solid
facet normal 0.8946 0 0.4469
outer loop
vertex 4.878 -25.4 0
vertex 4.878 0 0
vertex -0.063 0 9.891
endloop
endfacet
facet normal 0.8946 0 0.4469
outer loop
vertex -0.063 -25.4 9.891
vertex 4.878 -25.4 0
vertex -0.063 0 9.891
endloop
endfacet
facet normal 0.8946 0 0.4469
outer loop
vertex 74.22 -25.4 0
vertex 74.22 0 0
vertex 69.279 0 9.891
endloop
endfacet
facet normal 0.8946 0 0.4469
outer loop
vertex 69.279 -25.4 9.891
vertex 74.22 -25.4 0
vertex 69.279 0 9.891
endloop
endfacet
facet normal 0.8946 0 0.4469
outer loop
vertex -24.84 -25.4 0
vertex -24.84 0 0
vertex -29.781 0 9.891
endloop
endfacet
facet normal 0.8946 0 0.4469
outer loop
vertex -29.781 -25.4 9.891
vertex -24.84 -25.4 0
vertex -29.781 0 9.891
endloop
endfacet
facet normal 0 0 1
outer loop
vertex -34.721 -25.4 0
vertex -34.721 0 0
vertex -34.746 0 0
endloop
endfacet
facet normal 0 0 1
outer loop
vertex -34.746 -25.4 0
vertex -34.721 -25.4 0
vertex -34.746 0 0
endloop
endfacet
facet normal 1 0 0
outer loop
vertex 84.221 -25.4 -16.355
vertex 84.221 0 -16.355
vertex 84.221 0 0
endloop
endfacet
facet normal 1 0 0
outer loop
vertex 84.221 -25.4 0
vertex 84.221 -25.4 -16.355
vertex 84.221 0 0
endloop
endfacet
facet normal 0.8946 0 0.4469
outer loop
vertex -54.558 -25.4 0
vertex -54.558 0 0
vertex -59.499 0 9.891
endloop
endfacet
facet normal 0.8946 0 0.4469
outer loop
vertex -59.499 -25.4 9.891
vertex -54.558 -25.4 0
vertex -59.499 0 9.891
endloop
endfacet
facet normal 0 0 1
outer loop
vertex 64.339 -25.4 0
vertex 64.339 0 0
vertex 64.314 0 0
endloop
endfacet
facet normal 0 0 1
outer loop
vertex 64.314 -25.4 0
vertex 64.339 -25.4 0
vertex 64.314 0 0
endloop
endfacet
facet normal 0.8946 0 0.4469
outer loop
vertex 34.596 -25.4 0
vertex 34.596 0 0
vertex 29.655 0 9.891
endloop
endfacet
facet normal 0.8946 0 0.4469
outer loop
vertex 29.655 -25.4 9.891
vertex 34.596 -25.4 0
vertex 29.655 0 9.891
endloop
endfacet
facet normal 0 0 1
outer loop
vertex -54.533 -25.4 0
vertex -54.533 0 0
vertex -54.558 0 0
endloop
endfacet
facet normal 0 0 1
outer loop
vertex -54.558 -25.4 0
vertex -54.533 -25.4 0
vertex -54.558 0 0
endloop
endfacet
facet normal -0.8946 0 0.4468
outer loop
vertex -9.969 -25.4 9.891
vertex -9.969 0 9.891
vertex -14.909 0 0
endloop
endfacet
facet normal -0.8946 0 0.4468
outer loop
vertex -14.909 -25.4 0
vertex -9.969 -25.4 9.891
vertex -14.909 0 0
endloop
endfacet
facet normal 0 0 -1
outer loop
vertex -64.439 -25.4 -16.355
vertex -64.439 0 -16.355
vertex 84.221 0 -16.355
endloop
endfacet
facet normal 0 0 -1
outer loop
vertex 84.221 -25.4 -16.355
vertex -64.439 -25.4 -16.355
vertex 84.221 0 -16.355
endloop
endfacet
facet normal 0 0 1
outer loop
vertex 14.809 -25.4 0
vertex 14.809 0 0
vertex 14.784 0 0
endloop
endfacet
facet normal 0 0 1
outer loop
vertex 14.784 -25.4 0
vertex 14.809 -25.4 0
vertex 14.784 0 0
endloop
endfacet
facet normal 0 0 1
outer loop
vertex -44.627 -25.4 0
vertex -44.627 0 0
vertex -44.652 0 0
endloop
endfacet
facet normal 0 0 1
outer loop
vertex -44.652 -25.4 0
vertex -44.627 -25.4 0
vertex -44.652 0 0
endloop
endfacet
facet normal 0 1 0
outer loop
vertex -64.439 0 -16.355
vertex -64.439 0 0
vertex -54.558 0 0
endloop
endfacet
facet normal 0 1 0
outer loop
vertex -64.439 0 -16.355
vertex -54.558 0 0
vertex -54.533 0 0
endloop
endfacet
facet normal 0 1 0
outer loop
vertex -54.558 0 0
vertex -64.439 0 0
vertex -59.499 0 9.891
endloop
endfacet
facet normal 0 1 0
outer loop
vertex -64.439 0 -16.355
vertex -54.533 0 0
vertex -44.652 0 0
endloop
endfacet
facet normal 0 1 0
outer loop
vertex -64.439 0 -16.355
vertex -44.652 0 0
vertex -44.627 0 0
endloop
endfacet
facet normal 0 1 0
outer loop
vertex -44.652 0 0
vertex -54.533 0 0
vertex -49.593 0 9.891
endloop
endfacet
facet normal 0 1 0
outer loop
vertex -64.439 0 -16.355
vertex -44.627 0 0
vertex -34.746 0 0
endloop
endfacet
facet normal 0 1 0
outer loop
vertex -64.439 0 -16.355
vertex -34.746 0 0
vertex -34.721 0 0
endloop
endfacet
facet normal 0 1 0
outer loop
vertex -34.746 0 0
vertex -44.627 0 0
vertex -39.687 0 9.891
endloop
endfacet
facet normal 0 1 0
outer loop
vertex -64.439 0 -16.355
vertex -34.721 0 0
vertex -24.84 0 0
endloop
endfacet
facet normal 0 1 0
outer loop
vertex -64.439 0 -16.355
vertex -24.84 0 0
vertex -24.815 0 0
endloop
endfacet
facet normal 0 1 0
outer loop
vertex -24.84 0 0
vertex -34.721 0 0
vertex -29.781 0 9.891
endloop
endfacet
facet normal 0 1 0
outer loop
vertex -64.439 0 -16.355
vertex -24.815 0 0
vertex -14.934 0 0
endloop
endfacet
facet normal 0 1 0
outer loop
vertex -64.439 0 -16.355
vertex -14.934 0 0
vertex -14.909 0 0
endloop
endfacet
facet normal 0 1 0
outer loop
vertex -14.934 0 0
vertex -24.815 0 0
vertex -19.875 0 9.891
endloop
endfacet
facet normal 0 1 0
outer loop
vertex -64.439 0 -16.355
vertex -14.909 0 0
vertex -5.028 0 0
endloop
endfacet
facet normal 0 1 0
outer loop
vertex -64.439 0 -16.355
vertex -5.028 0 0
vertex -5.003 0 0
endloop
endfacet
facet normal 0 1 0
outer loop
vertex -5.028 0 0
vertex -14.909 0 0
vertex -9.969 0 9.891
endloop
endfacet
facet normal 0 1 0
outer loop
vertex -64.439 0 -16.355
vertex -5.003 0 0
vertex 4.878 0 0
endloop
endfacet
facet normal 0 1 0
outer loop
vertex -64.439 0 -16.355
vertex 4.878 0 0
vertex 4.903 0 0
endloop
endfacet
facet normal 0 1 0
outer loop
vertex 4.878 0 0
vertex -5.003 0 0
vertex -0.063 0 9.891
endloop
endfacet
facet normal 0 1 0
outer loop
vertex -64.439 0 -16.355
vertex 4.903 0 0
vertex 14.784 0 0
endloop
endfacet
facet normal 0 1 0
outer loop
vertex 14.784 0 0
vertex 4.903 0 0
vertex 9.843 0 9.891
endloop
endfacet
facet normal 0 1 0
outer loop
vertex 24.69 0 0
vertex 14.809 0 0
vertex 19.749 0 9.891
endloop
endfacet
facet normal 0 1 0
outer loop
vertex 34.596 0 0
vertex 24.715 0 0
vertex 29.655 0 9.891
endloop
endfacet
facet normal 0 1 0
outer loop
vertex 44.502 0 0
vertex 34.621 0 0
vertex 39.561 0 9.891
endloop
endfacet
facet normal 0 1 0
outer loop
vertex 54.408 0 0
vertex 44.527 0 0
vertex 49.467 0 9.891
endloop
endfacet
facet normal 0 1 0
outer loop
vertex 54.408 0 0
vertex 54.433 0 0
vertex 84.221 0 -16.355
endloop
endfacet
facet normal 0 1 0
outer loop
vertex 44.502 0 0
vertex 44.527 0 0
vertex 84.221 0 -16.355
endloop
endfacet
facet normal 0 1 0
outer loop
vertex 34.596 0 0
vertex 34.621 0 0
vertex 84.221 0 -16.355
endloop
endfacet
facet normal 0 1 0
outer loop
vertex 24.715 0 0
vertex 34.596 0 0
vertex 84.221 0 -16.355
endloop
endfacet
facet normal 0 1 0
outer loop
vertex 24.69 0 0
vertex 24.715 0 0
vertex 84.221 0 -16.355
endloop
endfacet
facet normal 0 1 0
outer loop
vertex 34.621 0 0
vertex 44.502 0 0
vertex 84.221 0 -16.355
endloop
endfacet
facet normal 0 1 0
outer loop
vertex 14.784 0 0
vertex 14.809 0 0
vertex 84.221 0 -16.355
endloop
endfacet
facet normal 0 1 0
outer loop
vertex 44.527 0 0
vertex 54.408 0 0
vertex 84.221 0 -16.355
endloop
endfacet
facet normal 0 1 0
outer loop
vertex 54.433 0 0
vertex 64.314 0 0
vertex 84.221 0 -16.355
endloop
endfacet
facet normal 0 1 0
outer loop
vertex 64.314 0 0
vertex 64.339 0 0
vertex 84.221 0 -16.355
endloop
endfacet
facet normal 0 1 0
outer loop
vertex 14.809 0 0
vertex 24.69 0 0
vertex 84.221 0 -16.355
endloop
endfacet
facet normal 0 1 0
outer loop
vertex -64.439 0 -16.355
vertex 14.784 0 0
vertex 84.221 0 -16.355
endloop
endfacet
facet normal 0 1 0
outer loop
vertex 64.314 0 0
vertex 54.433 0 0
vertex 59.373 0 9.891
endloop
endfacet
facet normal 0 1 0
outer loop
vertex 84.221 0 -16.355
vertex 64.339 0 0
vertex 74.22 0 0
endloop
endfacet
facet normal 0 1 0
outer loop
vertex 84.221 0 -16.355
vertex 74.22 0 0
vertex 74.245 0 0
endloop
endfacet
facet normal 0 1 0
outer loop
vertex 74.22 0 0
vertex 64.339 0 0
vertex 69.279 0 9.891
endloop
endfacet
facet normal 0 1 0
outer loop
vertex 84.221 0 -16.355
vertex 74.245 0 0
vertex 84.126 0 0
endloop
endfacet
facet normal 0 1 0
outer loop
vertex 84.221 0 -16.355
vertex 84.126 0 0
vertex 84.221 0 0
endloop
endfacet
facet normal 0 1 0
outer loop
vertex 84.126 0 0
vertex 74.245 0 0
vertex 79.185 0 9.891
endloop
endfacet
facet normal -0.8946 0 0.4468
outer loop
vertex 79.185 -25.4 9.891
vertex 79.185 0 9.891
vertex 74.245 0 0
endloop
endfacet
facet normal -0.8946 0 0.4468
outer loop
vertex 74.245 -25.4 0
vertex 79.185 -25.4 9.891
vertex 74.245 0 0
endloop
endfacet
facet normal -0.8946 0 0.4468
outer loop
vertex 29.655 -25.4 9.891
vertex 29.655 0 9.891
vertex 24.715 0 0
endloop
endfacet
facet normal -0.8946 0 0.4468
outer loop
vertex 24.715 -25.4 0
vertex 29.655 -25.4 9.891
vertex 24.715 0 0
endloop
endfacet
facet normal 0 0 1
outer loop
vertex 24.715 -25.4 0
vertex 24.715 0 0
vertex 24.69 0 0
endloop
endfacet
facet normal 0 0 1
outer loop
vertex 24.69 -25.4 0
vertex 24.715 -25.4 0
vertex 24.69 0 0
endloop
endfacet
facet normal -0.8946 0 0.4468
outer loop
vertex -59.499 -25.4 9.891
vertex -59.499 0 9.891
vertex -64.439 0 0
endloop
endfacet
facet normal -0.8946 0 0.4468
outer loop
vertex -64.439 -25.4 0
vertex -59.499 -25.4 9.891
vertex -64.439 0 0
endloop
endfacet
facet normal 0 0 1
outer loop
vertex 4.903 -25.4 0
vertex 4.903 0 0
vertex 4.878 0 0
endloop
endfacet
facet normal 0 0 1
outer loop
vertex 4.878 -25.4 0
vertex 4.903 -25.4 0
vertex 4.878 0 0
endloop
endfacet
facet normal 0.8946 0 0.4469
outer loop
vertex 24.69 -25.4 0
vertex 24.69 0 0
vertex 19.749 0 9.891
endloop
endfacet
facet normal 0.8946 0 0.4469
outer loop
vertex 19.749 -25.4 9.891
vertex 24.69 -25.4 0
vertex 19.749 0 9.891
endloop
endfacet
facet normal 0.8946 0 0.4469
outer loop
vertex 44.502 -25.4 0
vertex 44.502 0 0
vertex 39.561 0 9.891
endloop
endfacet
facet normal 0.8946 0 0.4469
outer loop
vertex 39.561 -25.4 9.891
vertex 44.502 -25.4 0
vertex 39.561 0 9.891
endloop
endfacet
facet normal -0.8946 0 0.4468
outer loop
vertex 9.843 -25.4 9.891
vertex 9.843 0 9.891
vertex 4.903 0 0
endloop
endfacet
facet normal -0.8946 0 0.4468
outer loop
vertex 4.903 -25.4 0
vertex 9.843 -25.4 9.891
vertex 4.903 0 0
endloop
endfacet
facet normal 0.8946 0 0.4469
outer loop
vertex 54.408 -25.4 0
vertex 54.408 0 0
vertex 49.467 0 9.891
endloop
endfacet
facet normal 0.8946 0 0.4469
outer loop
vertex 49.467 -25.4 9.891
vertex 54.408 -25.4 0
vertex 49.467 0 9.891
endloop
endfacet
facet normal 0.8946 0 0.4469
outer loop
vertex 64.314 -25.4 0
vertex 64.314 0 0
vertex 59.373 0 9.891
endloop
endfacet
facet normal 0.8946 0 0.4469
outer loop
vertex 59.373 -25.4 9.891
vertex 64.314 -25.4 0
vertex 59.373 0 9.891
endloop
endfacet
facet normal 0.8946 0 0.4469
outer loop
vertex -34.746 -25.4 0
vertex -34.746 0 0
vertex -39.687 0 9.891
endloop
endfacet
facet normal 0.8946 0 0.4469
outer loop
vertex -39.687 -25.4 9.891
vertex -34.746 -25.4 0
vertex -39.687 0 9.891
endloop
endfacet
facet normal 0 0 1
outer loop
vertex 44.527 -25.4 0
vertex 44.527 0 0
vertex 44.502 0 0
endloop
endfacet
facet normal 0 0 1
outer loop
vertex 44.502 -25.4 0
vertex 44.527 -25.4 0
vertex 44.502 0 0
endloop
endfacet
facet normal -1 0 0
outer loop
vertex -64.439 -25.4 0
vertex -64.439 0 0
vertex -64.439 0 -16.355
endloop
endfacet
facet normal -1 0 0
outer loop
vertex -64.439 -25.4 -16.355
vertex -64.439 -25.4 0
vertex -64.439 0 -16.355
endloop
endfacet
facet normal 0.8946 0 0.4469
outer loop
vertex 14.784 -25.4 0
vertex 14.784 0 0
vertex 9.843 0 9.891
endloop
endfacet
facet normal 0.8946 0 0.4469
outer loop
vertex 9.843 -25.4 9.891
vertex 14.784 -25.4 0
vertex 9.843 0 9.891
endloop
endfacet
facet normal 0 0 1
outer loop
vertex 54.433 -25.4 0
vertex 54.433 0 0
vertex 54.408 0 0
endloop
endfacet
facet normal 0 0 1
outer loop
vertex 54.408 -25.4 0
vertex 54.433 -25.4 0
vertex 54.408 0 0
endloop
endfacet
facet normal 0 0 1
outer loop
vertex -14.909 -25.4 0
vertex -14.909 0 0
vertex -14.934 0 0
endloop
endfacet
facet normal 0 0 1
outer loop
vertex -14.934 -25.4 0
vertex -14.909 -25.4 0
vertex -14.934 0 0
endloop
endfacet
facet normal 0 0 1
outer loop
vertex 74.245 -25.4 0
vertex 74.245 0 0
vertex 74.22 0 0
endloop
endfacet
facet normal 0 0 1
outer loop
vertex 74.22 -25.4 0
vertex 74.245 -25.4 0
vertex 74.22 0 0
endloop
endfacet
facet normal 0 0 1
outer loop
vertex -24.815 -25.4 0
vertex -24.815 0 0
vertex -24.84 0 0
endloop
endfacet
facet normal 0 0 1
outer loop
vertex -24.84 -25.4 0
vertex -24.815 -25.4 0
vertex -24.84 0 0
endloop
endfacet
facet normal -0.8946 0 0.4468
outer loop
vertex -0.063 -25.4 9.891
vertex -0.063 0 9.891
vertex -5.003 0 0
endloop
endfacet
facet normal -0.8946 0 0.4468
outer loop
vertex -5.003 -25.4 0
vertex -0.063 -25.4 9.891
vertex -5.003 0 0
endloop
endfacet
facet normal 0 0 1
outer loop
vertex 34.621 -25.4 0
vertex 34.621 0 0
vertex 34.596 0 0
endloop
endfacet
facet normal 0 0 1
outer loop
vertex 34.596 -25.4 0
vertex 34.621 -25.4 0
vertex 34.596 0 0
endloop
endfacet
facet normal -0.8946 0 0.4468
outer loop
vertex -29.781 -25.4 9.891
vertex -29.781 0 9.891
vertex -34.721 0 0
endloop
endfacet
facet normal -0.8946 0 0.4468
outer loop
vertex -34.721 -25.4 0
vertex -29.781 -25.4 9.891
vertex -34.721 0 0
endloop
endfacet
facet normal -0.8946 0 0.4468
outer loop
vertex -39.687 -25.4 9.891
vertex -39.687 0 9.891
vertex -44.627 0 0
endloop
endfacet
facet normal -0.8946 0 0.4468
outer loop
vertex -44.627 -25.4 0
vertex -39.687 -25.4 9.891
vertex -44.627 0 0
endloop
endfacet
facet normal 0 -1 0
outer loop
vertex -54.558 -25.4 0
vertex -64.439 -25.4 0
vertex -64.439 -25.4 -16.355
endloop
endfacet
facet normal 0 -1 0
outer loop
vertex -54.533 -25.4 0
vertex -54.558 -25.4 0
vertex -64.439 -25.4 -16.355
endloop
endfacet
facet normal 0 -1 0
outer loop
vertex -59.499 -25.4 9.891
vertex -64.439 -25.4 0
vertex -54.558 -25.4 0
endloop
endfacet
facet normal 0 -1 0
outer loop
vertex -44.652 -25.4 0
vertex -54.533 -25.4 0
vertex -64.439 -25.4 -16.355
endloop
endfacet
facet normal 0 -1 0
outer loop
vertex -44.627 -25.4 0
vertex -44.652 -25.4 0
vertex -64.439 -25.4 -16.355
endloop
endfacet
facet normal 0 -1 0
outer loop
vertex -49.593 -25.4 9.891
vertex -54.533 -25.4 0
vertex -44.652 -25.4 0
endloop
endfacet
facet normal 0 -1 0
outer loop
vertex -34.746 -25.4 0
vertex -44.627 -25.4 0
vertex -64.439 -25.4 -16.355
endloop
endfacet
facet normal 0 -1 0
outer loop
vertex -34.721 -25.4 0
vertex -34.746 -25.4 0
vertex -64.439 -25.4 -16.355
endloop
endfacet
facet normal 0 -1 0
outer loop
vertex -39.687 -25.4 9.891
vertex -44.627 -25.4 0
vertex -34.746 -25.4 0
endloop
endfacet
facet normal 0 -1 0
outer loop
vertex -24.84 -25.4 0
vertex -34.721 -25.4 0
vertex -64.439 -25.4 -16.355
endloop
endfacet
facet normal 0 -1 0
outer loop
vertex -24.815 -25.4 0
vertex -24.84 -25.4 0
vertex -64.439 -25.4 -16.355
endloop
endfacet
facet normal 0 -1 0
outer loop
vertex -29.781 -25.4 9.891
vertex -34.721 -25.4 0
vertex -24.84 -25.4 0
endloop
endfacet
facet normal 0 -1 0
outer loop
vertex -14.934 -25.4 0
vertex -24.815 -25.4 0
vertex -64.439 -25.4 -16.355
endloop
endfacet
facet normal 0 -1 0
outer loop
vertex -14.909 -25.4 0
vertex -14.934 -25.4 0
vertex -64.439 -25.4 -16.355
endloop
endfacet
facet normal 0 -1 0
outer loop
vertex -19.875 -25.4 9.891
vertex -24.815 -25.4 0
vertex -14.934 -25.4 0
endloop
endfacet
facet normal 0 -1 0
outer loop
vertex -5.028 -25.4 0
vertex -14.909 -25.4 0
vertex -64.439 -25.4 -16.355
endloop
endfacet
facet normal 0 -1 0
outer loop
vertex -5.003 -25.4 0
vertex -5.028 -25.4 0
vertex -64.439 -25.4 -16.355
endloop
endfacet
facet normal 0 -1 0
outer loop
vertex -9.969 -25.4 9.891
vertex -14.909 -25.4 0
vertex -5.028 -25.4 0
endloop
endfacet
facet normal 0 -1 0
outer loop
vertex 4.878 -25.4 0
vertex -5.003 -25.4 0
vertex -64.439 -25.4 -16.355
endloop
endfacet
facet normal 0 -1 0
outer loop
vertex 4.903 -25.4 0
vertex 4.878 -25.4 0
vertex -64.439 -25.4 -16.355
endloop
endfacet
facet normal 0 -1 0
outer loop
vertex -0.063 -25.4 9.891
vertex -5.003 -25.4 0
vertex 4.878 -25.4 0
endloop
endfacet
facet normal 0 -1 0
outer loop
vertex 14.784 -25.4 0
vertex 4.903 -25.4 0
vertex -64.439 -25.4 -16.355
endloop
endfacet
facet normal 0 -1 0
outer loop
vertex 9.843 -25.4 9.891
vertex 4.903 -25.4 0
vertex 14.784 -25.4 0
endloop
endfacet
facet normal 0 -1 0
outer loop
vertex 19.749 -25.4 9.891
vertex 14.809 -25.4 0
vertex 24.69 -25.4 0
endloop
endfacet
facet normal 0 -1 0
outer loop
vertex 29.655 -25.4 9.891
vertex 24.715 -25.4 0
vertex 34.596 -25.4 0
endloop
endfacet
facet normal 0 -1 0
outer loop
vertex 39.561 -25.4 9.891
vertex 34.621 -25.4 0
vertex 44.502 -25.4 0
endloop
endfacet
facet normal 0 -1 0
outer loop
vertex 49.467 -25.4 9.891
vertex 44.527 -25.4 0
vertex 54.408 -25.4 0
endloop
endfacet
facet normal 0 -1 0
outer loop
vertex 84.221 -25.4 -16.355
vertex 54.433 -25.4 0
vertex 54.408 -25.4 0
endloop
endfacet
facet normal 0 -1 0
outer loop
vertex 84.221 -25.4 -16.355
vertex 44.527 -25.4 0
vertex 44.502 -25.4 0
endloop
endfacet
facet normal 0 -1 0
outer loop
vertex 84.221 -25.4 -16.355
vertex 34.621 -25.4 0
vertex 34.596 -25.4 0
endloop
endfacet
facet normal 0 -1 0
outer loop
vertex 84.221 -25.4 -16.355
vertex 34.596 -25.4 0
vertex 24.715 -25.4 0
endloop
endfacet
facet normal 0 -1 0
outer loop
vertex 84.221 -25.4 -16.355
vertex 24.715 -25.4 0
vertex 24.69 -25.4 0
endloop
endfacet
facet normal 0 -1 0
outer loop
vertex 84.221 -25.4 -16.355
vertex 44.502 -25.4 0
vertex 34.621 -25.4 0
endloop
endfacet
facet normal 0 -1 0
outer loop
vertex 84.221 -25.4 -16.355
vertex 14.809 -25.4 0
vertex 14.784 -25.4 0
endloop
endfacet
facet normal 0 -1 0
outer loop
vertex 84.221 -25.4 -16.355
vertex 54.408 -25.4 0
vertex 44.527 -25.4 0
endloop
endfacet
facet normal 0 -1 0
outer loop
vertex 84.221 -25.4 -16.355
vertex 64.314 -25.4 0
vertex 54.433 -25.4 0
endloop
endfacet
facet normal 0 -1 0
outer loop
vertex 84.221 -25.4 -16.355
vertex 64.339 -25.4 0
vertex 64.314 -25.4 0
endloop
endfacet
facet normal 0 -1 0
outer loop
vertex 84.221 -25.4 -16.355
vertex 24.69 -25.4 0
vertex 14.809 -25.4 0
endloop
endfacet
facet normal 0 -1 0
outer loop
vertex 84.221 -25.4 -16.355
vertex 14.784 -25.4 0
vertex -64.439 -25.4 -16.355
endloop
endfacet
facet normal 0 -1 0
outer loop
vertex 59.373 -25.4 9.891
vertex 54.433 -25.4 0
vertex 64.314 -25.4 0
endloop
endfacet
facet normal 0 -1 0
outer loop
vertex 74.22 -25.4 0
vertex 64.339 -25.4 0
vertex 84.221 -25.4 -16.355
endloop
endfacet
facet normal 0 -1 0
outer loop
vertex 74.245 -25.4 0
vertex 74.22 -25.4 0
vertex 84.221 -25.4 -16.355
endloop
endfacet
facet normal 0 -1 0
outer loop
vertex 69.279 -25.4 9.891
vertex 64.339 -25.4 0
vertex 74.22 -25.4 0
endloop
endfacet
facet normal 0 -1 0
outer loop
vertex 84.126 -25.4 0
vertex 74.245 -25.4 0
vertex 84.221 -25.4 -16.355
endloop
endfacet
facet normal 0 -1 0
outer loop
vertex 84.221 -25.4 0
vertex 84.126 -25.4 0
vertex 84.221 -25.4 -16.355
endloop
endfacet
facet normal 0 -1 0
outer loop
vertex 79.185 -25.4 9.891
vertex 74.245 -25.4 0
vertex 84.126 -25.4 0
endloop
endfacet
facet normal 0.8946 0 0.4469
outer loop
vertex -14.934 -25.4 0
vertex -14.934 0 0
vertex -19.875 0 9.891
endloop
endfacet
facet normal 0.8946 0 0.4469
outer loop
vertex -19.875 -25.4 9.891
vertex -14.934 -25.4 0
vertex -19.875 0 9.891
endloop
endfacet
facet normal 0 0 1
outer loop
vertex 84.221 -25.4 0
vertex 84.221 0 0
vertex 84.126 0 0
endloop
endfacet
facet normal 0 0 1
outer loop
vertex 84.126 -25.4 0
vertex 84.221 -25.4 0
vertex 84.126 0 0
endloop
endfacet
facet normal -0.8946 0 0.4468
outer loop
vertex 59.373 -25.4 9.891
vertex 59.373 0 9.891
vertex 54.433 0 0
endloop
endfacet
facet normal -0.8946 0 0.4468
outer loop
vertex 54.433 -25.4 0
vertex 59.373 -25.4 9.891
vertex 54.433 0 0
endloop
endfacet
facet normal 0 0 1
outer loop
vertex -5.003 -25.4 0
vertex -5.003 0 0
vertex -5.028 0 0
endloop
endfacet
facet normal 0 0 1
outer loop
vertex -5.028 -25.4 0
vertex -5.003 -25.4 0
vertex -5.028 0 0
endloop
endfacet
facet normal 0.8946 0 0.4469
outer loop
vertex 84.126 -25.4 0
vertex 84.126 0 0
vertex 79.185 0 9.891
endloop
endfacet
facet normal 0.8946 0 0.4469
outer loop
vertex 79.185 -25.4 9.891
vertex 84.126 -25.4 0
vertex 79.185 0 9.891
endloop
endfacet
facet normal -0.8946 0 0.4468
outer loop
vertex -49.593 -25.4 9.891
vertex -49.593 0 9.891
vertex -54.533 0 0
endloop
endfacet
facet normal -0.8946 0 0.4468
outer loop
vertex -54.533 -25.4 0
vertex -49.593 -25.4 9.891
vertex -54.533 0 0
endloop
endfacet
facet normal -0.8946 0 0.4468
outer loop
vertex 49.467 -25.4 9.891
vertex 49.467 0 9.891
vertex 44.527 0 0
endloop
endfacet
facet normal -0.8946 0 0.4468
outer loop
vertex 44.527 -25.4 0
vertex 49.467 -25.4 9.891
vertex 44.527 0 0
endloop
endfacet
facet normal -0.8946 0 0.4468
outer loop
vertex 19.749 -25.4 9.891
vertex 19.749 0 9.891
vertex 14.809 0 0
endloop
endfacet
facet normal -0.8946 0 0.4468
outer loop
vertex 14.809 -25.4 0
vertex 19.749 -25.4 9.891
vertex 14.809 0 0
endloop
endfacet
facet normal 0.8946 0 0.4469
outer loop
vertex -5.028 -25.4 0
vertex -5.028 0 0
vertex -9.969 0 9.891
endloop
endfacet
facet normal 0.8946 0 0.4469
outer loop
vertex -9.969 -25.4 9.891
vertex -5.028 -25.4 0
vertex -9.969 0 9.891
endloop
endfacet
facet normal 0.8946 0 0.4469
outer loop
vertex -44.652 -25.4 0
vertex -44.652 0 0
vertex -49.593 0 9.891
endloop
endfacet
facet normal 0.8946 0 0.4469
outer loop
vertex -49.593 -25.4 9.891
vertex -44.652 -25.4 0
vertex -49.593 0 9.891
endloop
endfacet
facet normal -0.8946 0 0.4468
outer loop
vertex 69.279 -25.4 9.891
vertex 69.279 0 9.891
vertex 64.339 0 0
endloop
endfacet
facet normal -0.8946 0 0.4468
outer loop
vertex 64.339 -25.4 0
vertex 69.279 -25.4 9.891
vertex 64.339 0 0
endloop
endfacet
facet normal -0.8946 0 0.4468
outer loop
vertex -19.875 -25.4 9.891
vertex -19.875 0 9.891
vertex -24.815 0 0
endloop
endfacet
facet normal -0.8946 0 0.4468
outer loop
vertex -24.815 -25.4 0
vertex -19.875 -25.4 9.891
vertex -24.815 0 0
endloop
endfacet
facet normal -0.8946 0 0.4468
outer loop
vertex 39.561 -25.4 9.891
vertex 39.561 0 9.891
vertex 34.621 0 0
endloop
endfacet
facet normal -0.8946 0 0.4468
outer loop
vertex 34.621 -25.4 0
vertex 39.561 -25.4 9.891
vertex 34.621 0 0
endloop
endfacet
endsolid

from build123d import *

# Parameters (mm, degrees)
F1_DEPTH = 25.4


with BuildPart() as f1:
    # F0 (on Front) → F1 (new body)
    with BuildSketch(Plane.XZ):
        Polygon((54.433102, 0), (64.313702, 0), (59.373402, 9.891078), align=None)
        Polygon((44.527102, 0), (54.407702, 0), (49.467402, 9.891078), align=None)
        Polygon((34.621102, 0), (44.501702, 0), (39.561402, 9.891078), align=None)
        Polygon((24.715102, 0), (34.595702, 0), (29.655402, 9.891078), align=None)
        Polygon((19.749402, 9.891078), (14.809102, 0), (24.689702, 0), align=None)
        Polygon((9.843402, 9.891078), (4.903102, 0), (14.783702, 0), align=None)
        Polygon((-0.062598, 9.891078), (-5.002898, 0), (4.877702, 0), align=None)
        Polygon((-9.968598, 9.891078), (-14.908898, 0), (-5.028298, 0), align=None)
        Polygon((-19.874598, 9.891078), (-24.814898, 0), (-14.934298, 0), align=None)
        Polygon((-29.780598, 9.891078), (-34.720898, 0), (-24.840298, 0), align=None)
        Polygon((-39.686598, 9.891078), (-44.626898, 0), (-34.746298, 0), align=None)
        Polygon((-49.592598, 9.891078), (-54.532898, 0), (-44.652298, 0), align=None)
        Polygon((-59.498598, 9.891078), (-64.438898, 0), (-54.558298, 0), align=None)
        Polygon((74.245102, 0), (84.125702, 0), (79.185402, 9.891078), align=None)
        Polygon((64.339102, 0), (74.219702, 0), (69.279402, 9.891078), align=None)
        Polygon((-54.558298, 0), (-64.438898, 0), (-64.438898, -16.354553), (84.22105, -16.354553), (84.22105, 0), (84.125702, 0), (74.245102, 0), (74.219702, 0), (64.339102, 0), (64.313702, 0), (54.433102, 0), (54.407702, 0), (44.527102, 0), (44.501702, 0), (34.621102, 0), (34.595702, 0), (24.715102, 0), (24.689702, 0), (14.809102, 0), (14.783702, 0), (4.903102, 0), (4.877702, 0), (-5.002898, 0), (-5.028298, 0), (-14.908898, 0), (-14.934298, 0), (-24.814898, 0), (-24.840298, 0), (-34.720898, 0), (-34.746298, 0), (-44.626898, 0), (-44.652298, 0), (-54.532898, 0), align=None)
    extrude(amount=F1_DEPTH)


solid = f1.part
